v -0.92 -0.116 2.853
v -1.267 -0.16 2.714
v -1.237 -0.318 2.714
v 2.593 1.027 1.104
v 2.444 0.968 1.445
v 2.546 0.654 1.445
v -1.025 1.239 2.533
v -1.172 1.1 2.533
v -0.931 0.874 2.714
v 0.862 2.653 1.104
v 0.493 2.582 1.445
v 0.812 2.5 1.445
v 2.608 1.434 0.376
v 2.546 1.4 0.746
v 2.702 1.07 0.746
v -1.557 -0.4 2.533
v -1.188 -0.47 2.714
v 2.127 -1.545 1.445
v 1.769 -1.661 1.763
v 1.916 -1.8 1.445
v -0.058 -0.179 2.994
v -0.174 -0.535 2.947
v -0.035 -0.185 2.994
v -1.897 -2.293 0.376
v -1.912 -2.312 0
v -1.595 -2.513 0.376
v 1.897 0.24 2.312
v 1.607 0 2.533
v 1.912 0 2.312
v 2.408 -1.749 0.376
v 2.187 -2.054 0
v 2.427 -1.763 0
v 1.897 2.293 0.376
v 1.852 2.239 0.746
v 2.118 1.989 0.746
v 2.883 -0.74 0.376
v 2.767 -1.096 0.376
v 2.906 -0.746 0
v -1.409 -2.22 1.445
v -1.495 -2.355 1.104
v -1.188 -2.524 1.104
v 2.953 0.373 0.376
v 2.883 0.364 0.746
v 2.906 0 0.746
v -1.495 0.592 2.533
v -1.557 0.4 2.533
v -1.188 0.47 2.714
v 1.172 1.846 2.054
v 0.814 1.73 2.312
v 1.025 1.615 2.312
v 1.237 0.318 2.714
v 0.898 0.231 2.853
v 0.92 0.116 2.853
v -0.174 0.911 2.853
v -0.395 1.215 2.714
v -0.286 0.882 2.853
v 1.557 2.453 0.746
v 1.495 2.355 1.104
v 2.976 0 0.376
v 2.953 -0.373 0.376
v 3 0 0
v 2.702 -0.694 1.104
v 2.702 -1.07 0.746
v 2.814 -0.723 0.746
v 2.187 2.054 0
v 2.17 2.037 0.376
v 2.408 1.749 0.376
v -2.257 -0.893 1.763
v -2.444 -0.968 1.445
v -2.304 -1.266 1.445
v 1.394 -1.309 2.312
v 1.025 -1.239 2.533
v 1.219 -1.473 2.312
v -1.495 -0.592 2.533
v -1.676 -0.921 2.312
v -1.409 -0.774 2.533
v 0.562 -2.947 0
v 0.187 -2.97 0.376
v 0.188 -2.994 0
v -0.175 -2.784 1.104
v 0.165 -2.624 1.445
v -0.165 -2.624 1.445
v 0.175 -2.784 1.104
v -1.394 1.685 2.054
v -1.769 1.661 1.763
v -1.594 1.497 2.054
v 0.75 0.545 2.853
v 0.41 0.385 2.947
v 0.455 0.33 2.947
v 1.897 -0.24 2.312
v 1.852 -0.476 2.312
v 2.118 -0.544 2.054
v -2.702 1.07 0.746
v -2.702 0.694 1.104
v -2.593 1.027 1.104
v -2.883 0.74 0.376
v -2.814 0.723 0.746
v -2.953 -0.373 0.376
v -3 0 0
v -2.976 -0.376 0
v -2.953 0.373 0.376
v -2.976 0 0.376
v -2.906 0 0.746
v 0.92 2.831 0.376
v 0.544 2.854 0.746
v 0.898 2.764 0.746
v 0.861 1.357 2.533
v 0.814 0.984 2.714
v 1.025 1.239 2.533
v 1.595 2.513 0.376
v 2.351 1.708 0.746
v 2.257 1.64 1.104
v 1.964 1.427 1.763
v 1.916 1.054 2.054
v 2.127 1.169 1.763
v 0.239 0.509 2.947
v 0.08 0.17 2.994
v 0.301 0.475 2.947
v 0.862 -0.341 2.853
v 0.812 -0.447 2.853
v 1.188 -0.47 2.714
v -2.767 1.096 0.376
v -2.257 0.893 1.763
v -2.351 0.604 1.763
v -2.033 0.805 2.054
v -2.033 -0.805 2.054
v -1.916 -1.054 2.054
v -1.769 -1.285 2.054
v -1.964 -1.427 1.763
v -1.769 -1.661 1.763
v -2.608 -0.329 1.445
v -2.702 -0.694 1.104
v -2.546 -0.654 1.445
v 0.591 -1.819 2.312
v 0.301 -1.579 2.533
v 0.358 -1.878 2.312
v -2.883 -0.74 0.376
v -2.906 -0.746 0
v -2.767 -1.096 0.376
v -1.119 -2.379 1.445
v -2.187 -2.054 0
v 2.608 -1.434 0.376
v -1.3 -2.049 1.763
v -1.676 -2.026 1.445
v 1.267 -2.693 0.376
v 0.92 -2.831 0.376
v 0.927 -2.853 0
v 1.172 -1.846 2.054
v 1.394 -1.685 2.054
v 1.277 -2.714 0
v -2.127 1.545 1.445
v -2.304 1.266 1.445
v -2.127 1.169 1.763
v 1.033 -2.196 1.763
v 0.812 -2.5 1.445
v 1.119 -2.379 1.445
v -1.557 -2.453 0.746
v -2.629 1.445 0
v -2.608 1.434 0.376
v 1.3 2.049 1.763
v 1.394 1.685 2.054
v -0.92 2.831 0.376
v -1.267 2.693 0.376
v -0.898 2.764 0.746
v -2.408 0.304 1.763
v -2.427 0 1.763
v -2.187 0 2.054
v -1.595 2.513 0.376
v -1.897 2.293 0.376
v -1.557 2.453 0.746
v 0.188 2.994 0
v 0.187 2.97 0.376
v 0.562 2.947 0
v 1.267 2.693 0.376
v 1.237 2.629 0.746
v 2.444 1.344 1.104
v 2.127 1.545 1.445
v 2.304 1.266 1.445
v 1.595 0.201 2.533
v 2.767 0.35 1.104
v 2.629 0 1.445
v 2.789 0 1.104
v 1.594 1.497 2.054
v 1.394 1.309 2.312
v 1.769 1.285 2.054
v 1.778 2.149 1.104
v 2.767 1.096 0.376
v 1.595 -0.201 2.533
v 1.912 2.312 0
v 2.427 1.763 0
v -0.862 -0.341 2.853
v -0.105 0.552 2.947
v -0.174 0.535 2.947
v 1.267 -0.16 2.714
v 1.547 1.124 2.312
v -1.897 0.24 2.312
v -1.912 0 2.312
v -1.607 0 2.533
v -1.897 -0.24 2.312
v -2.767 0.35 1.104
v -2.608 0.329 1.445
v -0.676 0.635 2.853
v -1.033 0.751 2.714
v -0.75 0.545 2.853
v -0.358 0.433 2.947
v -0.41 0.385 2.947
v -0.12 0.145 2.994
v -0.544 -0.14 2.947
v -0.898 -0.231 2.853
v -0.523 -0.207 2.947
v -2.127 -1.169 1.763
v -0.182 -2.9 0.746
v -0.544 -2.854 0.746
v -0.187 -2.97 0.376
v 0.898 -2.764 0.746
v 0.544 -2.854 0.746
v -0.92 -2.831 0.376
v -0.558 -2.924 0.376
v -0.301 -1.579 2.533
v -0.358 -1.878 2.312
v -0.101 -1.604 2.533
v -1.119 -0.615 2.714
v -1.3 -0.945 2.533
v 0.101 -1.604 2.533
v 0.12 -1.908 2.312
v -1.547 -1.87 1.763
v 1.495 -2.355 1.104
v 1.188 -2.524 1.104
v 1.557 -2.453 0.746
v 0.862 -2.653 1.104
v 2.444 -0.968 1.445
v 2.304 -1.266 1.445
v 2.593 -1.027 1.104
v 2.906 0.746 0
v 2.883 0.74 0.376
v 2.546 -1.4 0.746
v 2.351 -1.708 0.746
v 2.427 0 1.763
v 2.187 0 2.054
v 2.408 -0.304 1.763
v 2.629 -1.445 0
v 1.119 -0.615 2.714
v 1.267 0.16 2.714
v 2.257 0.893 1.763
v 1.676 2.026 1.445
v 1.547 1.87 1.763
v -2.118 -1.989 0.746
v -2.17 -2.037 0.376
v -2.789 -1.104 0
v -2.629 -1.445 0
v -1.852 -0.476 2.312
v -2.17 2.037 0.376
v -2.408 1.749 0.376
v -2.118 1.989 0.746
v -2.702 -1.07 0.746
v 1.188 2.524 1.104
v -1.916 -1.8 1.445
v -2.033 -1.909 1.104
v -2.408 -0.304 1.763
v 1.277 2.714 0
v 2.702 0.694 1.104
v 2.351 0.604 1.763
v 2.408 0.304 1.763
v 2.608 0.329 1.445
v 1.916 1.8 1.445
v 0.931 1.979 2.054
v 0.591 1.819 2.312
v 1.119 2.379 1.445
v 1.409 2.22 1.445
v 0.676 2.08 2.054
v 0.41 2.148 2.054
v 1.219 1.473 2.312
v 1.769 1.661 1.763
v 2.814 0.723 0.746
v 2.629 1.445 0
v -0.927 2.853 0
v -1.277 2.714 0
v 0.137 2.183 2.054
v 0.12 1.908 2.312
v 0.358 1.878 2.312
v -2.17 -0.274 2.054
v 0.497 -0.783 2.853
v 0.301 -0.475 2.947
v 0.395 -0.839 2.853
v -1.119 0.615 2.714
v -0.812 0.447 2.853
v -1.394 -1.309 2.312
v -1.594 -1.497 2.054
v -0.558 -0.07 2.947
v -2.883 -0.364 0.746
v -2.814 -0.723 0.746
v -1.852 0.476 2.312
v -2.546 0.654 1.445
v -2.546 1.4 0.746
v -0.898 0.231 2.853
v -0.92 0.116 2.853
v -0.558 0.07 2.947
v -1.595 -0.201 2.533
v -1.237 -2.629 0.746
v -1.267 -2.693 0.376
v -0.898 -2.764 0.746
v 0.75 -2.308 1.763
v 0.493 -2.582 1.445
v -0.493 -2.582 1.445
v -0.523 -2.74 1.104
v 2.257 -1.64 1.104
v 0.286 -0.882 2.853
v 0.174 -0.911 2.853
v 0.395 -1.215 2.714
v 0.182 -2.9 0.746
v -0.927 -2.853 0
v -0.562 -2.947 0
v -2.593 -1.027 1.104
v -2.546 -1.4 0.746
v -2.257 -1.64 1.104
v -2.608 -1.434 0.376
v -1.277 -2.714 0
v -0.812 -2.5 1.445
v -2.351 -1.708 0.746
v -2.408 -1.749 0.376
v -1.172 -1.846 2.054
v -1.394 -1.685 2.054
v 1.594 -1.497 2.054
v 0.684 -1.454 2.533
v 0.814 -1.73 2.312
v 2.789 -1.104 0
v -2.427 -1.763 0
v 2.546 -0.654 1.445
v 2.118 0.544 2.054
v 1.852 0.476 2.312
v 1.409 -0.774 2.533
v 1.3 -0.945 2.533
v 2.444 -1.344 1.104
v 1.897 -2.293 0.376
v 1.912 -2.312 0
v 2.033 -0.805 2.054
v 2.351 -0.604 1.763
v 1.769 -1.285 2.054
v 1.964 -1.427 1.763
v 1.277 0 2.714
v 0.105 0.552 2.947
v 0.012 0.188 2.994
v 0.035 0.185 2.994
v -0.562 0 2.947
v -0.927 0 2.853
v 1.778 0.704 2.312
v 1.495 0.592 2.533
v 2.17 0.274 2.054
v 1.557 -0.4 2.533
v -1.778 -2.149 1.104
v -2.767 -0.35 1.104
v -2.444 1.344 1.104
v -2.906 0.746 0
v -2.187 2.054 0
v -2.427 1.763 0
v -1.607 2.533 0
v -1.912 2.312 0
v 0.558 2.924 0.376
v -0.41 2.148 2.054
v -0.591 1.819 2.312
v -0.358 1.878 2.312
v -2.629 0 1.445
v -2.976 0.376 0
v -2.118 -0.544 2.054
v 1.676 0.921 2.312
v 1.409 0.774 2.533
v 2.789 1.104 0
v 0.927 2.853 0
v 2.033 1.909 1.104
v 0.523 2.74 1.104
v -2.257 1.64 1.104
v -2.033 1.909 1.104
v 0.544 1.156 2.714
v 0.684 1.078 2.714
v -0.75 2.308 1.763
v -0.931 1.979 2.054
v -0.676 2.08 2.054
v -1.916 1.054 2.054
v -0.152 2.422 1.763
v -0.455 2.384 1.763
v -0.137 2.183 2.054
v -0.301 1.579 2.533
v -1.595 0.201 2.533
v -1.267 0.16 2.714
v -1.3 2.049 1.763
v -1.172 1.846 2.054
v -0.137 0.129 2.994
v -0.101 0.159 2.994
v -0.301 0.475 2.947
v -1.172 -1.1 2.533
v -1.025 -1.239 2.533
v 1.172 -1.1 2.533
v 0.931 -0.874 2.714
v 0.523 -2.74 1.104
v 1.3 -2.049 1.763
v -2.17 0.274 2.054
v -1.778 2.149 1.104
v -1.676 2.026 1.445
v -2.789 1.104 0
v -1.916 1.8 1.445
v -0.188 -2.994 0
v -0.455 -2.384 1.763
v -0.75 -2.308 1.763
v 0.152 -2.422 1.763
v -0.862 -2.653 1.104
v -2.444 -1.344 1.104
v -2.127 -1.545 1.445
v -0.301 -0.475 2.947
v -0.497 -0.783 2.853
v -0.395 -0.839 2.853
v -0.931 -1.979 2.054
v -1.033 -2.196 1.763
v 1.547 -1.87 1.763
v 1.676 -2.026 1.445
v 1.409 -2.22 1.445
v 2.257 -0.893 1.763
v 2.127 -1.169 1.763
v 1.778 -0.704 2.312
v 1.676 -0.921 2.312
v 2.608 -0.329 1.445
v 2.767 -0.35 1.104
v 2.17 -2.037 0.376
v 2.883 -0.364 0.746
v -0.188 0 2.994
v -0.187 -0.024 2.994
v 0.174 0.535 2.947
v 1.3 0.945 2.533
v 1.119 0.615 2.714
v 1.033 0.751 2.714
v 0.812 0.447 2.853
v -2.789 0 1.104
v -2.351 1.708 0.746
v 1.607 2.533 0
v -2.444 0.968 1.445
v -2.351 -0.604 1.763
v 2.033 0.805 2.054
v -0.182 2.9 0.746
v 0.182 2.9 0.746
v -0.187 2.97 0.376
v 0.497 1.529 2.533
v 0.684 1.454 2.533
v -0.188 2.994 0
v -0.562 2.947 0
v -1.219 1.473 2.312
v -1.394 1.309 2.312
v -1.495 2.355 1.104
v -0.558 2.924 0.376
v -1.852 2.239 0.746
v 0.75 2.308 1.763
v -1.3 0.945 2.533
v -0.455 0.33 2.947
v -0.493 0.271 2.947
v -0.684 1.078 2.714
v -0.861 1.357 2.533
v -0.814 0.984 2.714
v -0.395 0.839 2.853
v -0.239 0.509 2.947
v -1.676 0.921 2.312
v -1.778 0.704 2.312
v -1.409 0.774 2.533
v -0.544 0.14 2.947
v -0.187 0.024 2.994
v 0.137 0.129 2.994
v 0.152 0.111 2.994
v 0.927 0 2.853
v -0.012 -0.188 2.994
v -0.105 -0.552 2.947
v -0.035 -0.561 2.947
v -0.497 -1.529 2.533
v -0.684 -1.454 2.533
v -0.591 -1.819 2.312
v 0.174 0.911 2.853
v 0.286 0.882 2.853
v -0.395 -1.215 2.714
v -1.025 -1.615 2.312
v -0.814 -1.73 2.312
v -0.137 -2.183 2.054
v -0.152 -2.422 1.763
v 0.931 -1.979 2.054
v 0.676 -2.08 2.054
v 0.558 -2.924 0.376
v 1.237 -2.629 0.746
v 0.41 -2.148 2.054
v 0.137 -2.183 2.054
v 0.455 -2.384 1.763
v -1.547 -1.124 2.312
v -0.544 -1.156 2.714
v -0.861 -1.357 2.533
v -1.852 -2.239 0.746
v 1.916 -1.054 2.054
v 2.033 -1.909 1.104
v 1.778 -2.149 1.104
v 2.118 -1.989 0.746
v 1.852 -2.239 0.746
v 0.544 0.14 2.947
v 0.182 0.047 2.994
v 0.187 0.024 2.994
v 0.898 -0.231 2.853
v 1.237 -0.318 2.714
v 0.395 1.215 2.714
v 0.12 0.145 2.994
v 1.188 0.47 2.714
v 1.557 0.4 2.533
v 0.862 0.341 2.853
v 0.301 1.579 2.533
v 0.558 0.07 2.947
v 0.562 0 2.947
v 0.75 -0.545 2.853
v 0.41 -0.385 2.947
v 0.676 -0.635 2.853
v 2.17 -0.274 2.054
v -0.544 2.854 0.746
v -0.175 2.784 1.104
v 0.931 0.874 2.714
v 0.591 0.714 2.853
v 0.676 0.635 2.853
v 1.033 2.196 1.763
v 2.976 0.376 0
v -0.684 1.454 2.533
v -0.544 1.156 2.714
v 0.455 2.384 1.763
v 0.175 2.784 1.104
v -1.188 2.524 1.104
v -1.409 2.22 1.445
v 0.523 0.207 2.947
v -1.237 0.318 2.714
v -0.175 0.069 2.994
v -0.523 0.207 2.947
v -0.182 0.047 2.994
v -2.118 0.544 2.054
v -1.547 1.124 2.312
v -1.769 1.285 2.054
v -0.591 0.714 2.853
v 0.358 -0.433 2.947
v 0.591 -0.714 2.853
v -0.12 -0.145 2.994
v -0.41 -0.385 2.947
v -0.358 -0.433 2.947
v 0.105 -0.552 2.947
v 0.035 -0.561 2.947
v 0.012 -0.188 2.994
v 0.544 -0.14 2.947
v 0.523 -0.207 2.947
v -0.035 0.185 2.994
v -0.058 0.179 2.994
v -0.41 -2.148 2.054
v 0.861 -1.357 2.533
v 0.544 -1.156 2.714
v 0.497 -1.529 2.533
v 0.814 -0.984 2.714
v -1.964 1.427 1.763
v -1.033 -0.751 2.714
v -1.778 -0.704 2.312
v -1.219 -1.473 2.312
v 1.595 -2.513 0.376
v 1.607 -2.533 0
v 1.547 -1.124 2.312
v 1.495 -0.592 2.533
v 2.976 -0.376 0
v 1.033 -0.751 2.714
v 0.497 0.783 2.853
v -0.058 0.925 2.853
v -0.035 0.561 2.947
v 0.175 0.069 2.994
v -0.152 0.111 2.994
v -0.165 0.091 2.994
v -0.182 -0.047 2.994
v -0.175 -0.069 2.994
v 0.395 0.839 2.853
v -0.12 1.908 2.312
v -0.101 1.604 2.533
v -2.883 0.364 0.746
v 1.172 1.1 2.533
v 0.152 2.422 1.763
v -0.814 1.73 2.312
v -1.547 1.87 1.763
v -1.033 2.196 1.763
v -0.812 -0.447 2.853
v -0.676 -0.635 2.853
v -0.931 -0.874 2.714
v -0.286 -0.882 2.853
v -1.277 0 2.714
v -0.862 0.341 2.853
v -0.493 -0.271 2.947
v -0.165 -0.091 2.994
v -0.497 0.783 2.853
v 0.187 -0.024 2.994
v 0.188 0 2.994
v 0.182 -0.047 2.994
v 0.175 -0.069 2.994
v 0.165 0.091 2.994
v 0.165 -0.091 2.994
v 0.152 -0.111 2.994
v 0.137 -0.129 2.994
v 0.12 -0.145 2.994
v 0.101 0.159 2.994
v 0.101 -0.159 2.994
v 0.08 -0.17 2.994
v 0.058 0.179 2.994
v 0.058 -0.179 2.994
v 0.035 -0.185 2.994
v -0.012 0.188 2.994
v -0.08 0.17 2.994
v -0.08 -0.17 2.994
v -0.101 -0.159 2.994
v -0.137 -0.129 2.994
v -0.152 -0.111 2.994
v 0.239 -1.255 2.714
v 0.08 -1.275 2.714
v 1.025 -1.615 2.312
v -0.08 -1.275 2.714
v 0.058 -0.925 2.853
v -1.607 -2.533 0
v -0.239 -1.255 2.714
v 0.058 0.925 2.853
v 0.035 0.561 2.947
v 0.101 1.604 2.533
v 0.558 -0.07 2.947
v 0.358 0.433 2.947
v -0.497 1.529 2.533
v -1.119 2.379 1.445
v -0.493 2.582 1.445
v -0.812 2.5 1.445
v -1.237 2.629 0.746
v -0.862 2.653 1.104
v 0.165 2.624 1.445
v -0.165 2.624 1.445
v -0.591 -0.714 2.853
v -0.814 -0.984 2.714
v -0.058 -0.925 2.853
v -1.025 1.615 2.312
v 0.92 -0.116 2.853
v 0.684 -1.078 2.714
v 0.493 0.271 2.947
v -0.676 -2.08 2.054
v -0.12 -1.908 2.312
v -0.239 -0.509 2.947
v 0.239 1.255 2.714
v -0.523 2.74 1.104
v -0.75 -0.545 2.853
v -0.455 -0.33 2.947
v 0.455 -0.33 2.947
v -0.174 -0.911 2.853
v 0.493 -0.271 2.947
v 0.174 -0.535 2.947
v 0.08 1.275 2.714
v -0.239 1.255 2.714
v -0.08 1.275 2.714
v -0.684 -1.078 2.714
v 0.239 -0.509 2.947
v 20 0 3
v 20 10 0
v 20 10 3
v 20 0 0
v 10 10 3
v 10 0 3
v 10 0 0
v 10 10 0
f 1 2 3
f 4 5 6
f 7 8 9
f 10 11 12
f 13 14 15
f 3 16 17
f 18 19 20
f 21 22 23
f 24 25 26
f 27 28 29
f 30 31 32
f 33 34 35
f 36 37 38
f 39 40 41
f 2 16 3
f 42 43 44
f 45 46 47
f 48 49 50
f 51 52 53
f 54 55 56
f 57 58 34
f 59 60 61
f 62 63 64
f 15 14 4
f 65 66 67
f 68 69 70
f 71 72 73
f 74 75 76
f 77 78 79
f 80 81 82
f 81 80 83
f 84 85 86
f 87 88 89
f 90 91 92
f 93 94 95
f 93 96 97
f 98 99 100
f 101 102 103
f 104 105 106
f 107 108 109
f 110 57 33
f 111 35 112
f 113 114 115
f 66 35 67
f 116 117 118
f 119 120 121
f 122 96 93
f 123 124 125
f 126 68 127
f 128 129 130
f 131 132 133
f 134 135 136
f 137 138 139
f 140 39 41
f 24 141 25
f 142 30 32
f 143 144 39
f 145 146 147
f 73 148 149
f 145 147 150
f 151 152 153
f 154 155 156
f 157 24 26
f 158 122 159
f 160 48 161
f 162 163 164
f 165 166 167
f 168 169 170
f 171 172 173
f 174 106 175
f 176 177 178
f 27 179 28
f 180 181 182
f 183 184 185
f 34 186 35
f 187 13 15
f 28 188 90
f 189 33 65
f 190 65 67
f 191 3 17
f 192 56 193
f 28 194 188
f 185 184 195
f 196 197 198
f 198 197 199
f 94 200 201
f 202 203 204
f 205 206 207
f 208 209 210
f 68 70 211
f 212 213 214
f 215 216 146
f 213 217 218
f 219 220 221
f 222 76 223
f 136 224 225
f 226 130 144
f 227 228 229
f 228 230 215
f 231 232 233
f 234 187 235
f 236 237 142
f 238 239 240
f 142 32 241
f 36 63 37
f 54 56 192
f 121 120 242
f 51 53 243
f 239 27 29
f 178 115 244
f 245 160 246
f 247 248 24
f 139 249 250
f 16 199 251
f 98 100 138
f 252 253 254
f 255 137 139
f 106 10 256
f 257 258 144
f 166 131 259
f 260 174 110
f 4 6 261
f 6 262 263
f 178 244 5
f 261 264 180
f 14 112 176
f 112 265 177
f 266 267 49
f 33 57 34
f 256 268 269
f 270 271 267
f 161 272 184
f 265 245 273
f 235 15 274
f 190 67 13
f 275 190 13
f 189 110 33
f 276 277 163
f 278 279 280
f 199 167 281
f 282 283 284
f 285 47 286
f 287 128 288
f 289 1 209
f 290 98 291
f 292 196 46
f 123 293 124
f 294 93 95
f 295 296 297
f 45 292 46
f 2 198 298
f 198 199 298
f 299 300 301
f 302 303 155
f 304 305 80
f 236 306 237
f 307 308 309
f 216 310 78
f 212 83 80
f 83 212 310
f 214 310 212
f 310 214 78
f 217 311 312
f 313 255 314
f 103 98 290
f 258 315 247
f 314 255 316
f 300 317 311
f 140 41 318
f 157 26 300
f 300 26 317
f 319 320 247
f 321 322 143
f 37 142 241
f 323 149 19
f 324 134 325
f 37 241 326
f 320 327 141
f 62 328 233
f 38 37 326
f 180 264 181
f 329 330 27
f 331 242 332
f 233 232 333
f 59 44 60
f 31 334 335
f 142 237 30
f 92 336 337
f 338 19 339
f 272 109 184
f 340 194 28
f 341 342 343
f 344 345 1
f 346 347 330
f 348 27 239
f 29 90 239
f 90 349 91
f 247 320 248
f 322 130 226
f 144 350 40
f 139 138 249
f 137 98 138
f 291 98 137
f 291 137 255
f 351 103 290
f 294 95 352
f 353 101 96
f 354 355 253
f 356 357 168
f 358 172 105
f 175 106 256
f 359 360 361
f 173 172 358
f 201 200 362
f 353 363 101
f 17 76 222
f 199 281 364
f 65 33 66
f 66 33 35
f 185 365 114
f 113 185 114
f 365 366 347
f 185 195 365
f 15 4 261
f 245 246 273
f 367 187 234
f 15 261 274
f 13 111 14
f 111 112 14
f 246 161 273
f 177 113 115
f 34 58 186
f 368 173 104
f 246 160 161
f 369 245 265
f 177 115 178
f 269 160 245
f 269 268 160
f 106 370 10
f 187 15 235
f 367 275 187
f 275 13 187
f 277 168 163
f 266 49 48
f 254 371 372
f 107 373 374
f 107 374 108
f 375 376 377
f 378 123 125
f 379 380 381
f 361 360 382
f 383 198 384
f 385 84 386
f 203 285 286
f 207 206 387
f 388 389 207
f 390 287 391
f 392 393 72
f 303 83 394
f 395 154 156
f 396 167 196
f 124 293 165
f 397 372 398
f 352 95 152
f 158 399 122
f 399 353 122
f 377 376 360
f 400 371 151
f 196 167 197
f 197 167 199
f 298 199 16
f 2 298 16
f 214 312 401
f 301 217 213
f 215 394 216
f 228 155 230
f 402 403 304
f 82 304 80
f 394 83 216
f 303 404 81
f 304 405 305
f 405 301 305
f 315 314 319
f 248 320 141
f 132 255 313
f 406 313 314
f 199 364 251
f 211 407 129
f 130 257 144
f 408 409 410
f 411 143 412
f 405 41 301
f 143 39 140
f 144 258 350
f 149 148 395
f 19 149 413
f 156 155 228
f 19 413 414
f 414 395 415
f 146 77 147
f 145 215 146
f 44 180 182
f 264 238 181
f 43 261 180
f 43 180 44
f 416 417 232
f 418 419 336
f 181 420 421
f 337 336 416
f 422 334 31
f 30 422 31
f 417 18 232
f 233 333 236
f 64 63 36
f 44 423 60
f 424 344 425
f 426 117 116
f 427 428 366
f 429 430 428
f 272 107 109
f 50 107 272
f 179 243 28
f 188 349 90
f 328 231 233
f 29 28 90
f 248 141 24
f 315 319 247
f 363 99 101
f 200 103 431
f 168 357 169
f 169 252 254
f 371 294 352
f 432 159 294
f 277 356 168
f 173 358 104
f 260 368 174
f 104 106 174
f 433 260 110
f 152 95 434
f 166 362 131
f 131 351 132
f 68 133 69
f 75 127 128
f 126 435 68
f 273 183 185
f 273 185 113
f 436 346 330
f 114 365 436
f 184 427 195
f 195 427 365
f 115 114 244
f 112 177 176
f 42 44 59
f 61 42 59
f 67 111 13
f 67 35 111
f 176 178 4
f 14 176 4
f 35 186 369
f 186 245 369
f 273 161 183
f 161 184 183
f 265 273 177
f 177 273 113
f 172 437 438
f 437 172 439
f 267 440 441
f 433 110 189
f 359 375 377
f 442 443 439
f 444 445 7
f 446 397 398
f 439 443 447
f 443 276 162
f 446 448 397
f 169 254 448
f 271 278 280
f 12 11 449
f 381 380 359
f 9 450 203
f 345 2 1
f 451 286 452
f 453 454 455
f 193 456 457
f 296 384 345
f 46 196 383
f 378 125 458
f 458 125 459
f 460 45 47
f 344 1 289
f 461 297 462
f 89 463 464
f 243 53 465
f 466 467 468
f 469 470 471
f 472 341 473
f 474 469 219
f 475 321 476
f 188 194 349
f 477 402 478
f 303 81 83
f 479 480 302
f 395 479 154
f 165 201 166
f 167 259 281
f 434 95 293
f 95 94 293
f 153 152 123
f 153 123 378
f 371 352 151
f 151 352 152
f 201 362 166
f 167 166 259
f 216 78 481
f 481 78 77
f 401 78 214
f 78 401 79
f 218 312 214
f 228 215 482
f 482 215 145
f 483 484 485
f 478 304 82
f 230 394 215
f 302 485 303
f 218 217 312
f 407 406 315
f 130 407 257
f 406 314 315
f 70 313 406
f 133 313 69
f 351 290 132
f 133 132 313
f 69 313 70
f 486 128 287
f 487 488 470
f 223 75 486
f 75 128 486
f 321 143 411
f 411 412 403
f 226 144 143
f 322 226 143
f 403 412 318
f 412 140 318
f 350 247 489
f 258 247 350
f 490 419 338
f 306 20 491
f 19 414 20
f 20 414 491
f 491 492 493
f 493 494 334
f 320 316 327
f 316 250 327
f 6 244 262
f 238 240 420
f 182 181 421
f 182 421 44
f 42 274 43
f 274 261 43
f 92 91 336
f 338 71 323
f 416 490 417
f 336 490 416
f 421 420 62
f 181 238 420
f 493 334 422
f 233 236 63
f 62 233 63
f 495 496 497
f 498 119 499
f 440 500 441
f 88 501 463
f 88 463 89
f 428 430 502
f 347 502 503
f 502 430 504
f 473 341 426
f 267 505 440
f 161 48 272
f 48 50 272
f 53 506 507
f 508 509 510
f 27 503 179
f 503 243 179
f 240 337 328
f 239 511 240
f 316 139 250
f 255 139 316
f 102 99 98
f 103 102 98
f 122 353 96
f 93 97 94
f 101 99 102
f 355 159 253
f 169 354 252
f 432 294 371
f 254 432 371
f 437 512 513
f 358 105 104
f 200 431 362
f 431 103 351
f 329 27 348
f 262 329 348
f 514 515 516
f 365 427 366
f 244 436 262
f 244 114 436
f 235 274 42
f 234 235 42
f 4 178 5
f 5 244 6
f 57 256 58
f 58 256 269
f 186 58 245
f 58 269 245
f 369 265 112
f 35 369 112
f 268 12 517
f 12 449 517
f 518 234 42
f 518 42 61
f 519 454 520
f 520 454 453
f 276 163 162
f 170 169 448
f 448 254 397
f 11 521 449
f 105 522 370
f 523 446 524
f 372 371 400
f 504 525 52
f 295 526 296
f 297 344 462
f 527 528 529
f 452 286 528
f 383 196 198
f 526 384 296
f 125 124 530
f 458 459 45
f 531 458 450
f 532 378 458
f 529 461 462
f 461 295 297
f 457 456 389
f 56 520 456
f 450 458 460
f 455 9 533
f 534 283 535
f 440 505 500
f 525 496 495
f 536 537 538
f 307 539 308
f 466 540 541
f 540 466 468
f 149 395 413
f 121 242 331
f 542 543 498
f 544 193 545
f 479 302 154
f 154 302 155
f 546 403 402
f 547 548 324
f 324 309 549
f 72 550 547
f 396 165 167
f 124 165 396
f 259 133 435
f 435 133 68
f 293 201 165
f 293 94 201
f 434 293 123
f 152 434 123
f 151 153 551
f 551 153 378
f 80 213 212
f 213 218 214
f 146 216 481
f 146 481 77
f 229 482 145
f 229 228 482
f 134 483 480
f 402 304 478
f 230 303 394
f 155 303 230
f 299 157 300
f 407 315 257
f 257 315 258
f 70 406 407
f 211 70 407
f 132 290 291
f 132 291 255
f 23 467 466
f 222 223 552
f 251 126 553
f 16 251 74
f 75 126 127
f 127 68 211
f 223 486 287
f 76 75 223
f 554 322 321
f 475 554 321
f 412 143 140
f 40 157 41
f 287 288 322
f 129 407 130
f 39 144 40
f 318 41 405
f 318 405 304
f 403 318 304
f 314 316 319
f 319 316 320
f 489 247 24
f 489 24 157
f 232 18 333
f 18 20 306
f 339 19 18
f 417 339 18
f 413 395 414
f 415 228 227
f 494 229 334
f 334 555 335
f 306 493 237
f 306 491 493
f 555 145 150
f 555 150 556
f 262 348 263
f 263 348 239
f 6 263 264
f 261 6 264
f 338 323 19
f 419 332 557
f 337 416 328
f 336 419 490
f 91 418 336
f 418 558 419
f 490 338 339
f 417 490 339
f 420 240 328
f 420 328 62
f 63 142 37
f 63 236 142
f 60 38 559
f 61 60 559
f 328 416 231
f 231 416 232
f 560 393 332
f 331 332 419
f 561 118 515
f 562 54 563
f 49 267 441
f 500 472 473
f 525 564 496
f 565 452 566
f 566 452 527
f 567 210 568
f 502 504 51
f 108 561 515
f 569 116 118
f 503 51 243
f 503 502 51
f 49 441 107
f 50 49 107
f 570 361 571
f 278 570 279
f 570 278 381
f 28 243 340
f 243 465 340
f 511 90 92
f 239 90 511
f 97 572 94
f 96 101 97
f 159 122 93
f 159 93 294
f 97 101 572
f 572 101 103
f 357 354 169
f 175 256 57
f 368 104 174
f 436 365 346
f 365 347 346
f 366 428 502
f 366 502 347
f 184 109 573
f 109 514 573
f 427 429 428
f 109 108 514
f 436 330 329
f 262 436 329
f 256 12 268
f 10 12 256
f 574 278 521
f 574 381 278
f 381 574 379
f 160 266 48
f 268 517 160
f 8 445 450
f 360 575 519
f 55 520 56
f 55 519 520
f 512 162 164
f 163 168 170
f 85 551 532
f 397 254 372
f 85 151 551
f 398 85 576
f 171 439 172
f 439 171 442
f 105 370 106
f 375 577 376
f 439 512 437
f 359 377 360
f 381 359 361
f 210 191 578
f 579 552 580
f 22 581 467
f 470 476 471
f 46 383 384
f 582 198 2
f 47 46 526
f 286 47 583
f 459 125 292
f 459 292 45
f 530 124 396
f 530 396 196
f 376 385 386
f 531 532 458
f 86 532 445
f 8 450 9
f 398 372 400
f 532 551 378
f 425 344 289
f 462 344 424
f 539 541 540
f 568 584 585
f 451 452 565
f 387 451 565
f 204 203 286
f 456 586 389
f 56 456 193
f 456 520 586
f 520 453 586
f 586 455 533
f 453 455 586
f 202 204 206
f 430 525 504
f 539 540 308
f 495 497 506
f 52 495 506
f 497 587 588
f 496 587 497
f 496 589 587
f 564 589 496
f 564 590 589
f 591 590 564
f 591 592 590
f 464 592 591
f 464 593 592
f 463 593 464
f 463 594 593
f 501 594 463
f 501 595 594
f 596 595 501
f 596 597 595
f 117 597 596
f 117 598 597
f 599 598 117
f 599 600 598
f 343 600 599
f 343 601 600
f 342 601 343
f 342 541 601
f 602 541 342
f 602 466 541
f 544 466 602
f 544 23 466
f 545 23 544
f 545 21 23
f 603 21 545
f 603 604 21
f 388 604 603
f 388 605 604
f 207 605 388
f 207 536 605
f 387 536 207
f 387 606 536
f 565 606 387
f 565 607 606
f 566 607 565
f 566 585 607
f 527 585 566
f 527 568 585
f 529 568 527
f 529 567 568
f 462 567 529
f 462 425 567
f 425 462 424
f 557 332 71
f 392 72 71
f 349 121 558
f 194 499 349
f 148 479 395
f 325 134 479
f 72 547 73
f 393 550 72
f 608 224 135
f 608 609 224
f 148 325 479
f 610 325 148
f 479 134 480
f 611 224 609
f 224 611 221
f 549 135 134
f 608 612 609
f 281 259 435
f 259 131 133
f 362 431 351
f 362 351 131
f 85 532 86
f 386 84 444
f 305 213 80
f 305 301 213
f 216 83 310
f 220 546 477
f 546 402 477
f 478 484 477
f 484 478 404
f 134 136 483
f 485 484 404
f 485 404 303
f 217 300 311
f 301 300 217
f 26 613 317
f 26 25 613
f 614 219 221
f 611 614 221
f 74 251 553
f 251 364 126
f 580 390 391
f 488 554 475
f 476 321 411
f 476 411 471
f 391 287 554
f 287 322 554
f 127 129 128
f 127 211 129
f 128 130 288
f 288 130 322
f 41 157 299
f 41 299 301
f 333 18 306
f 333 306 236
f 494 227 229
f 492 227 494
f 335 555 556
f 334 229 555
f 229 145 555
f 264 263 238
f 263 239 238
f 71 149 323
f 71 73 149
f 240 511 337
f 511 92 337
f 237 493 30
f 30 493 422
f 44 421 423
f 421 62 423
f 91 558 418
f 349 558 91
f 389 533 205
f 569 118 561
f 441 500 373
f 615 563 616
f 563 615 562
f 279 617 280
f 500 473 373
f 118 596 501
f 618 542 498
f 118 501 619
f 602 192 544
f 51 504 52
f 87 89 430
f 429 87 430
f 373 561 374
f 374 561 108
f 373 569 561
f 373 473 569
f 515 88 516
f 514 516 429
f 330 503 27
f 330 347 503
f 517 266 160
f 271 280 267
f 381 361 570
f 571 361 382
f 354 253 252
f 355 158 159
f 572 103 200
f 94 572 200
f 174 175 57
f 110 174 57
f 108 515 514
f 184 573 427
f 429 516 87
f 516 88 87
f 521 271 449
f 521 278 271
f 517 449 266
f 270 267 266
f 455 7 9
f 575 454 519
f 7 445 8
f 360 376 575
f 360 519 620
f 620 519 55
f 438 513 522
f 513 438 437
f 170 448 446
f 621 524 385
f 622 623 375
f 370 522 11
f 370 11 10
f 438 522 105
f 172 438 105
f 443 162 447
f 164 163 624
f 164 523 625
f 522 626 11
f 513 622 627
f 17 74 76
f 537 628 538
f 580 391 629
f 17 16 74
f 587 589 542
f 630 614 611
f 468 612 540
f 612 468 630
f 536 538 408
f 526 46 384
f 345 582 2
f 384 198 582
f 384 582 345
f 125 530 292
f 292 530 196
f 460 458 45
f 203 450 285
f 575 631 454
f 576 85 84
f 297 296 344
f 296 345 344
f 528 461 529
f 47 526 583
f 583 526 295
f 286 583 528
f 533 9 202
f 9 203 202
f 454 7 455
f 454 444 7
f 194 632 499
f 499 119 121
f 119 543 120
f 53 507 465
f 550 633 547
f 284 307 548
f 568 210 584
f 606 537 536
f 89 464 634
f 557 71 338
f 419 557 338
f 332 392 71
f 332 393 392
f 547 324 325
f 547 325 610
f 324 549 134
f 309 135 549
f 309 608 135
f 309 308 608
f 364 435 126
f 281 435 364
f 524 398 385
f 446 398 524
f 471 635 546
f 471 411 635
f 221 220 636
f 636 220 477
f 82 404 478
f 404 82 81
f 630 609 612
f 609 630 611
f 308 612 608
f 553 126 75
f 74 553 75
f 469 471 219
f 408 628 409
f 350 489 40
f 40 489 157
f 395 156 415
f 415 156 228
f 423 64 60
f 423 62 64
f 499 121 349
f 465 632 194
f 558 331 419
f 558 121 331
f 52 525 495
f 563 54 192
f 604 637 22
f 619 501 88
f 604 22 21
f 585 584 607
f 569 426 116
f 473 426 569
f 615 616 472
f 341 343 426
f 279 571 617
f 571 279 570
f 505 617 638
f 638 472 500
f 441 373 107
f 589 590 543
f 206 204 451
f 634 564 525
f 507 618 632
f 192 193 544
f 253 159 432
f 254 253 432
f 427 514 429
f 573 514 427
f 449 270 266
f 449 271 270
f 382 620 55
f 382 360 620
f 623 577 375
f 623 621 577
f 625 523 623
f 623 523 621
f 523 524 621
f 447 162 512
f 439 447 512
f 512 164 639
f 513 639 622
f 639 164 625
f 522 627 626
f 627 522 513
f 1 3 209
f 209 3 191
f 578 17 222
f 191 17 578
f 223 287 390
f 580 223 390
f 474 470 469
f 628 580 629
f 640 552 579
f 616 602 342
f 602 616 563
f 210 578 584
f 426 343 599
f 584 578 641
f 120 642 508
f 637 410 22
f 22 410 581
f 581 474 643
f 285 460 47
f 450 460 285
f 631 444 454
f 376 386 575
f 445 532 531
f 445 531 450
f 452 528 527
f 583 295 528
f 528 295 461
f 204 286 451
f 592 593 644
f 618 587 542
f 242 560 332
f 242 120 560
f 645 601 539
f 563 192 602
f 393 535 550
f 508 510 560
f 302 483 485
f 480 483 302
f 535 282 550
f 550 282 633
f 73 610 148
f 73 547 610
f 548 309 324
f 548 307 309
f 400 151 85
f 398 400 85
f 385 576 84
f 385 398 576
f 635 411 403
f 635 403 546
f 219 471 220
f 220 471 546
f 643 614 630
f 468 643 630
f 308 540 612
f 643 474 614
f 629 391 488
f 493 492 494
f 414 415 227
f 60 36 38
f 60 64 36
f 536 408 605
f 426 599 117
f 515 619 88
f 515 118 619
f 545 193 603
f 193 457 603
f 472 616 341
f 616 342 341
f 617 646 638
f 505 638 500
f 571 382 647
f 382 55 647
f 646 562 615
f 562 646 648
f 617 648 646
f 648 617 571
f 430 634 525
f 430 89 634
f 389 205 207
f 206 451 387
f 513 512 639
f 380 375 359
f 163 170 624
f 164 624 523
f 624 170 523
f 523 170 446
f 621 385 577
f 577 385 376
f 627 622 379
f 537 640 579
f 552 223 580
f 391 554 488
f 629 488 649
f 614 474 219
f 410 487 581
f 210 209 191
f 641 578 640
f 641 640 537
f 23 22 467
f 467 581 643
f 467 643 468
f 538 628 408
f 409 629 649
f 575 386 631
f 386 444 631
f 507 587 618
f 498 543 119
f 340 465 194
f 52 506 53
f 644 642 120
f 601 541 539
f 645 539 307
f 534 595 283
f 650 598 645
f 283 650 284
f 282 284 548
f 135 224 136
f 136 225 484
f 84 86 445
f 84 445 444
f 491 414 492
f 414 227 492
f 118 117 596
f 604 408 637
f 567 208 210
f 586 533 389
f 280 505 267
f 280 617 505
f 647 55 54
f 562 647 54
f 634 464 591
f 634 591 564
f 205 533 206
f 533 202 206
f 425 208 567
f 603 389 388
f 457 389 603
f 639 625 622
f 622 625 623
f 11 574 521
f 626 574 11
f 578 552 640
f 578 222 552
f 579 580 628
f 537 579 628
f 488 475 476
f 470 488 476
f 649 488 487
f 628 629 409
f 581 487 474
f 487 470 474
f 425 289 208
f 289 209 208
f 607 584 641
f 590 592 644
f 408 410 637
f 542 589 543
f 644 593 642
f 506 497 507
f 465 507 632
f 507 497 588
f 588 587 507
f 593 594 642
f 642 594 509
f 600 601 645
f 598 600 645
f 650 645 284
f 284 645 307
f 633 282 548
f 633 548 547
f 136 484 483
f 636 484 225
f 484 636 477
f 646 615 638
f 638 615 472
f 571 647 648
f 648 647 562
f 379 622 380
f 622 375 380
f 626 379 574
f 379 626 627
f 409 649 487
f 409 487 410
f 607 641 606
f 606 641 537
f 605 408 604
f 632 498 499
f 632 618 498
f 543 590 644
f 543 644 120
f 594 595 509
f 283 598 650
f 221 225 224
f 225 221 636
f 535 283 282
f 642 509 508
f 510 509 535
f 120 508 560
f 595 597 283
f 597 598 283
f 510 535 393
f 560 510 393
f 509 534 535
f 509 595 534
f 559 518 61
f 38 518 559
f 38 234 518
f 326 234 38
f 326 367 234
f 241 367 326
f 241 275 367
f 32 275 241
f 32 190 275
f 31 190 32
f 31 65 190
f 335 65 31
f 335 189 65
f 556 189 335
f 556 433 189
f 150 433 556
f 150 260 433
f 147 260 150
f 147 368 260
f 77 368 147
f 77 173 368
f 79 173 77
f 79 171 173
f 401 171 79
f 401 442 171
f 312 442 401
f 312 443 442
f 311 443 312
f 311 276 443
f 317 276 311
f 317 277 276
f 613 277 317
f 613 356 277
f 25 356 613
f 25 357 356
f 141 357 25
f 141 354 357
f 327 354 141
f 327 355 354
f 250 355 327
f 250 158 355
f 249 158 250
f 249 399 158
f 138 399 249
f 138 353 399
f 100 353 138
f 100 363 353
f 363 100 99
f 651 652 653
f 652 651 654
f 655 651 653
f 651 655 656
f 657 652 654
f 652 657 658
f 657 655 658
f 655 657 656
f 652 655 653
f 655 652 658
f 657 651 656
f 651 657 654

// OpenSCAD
// Illustrates the minkowski summation and its uses.
//
// According to the [documentation]
// (https://en.wikibooks.org/wiki/OpenSCAD_User_Manual/Transformations#minkowski),
// the summation of a cylinder and a rectangle will sum their dimensions in all
// three axes (e.g. a 10x10x2 prism summed with an OD2 x 1 cylinder results in
// a 14x14x3 prism with fillets in the plane of the cylinder.)
//
// The basic premise:
//  - Draw the two components and their minkowski sum.
//  - Show the effect of translating the objects on the location of the sum.
//
// The Minkowski Sum explained:
//  According to [Wikipedia](https://en.wikipedia.org/wiki/Minkowski_addition),
//  the minkowski sum is set addition in which each vector inside a set is
//  added to each vector in another set.
//
//  How does this relate to OpenSCAD? Think of each body as a 'set' of points.
//  The minkowski sum takes each point in one shape, and adds it to each point
//  in the other.
//
//  One might imagine the minkoski sum in this way:
//    For our example, the two parts are a rectangular prism and a cylinder.
//    Take the cylinder at its origin. Place the cylinder on one corner of their
//    prism. Now treat the faces of the prism as your limits, then sweep the
//    cylinder around, keeping its origin inside the limits. Any point in space
//    occupied by the cylinder while you sweep around, bumping into the edges
//    of the cylinder, is kept in the final minkowski sum.
//
//    Now if the cylinder is translated so that it doesn't touch the origin,
//    its origin is still what must remain within the bounds of the prism,
//    causing the resulting 'painted' solid to be offset from the origin as
//    well.
//
//  This should also make it clear why the minkowski slows things down so much -
//  Drawing the sum requires a computation of every point on one shape for every
//  point on the other shape, so two 10-point shapes demand 100 calculations.

// Lower the resolution to save time on calculations
$fn = 50;

// Set the [X, Y, Z] dimensions of the rectangular prism.
prismDim = [10, 10, 3];
// Set the [X, Y, Z] location of the corner of the prism.
prismTranslate = [10, 0, 0];

// Set the radius of the cylinder.
cylR = 3;
// Set the height of the cylinder.
cylH = 1;
// Set the location of the center of the bottom of the cylinder.
cylTranslate = [0, 0, 0];

// Show the prism in space. This acts as the limits of where the origin of the
// cylinder can reach when sweeping the cylinder around.
prism();
// Show the cylinder. This is the 'paint brush'.
// cyl();
halfSph();

// Show the bounds of the expected rectangle, without fillets.
// The `#` will show this part in transluscent red.
// # expectedDims();

// Draw the minkowski sum. The `%` will show the part in transluscent grey.
% minkowski(){
  prism();
  //cyl();

  // So if you did a sphere instead here, you'd get rounded corners all around.
  // The minkowski would trace the sphere from its center around the span of
  // the prism or cylinder, whichever you leave uncommented.
  //sph();

  // And half sphere leaves the bottom with square edges.
  //halfSph();
}

module prism() {
  // Make an orange cube.
  color([1, 0.5, 0]) translate(prismTranslate) cube(prismDim);
}

module cyl() {
  // Make a blue cylinder.
  color([0, 0.5, 1]) translate(cylTranslate) cylinder(r=cylR, h=cylH);
}

module sph() {
  sphere(r=cylR);
}

module halfSph() {
  difference(){
      sph();
      translate([-cylR,-cylR,-cylR*2])cube(cylR*2);
  }
}

module expectedDims() {
  // This is going to be a conglomeraton of the above dimensions.
  // The X and Y become a sum of their lengths plus the diameter of the
  // cylinder.
  X = prismDim[0] + cylR*2;
  Y = prismDim[1] + cylR*2;
  Z = prismDim[2] + cylH;

  // The origin is a sum of the origins of the two parts.
  // Offset in the XY plane to account for the radius of the cylinder.
  trans = prismTranslate + cylTranslate - [cylR, cylR, 0];

  color([0, 1, 0]) translate(trans) cube([X, Y, Z]);
}
